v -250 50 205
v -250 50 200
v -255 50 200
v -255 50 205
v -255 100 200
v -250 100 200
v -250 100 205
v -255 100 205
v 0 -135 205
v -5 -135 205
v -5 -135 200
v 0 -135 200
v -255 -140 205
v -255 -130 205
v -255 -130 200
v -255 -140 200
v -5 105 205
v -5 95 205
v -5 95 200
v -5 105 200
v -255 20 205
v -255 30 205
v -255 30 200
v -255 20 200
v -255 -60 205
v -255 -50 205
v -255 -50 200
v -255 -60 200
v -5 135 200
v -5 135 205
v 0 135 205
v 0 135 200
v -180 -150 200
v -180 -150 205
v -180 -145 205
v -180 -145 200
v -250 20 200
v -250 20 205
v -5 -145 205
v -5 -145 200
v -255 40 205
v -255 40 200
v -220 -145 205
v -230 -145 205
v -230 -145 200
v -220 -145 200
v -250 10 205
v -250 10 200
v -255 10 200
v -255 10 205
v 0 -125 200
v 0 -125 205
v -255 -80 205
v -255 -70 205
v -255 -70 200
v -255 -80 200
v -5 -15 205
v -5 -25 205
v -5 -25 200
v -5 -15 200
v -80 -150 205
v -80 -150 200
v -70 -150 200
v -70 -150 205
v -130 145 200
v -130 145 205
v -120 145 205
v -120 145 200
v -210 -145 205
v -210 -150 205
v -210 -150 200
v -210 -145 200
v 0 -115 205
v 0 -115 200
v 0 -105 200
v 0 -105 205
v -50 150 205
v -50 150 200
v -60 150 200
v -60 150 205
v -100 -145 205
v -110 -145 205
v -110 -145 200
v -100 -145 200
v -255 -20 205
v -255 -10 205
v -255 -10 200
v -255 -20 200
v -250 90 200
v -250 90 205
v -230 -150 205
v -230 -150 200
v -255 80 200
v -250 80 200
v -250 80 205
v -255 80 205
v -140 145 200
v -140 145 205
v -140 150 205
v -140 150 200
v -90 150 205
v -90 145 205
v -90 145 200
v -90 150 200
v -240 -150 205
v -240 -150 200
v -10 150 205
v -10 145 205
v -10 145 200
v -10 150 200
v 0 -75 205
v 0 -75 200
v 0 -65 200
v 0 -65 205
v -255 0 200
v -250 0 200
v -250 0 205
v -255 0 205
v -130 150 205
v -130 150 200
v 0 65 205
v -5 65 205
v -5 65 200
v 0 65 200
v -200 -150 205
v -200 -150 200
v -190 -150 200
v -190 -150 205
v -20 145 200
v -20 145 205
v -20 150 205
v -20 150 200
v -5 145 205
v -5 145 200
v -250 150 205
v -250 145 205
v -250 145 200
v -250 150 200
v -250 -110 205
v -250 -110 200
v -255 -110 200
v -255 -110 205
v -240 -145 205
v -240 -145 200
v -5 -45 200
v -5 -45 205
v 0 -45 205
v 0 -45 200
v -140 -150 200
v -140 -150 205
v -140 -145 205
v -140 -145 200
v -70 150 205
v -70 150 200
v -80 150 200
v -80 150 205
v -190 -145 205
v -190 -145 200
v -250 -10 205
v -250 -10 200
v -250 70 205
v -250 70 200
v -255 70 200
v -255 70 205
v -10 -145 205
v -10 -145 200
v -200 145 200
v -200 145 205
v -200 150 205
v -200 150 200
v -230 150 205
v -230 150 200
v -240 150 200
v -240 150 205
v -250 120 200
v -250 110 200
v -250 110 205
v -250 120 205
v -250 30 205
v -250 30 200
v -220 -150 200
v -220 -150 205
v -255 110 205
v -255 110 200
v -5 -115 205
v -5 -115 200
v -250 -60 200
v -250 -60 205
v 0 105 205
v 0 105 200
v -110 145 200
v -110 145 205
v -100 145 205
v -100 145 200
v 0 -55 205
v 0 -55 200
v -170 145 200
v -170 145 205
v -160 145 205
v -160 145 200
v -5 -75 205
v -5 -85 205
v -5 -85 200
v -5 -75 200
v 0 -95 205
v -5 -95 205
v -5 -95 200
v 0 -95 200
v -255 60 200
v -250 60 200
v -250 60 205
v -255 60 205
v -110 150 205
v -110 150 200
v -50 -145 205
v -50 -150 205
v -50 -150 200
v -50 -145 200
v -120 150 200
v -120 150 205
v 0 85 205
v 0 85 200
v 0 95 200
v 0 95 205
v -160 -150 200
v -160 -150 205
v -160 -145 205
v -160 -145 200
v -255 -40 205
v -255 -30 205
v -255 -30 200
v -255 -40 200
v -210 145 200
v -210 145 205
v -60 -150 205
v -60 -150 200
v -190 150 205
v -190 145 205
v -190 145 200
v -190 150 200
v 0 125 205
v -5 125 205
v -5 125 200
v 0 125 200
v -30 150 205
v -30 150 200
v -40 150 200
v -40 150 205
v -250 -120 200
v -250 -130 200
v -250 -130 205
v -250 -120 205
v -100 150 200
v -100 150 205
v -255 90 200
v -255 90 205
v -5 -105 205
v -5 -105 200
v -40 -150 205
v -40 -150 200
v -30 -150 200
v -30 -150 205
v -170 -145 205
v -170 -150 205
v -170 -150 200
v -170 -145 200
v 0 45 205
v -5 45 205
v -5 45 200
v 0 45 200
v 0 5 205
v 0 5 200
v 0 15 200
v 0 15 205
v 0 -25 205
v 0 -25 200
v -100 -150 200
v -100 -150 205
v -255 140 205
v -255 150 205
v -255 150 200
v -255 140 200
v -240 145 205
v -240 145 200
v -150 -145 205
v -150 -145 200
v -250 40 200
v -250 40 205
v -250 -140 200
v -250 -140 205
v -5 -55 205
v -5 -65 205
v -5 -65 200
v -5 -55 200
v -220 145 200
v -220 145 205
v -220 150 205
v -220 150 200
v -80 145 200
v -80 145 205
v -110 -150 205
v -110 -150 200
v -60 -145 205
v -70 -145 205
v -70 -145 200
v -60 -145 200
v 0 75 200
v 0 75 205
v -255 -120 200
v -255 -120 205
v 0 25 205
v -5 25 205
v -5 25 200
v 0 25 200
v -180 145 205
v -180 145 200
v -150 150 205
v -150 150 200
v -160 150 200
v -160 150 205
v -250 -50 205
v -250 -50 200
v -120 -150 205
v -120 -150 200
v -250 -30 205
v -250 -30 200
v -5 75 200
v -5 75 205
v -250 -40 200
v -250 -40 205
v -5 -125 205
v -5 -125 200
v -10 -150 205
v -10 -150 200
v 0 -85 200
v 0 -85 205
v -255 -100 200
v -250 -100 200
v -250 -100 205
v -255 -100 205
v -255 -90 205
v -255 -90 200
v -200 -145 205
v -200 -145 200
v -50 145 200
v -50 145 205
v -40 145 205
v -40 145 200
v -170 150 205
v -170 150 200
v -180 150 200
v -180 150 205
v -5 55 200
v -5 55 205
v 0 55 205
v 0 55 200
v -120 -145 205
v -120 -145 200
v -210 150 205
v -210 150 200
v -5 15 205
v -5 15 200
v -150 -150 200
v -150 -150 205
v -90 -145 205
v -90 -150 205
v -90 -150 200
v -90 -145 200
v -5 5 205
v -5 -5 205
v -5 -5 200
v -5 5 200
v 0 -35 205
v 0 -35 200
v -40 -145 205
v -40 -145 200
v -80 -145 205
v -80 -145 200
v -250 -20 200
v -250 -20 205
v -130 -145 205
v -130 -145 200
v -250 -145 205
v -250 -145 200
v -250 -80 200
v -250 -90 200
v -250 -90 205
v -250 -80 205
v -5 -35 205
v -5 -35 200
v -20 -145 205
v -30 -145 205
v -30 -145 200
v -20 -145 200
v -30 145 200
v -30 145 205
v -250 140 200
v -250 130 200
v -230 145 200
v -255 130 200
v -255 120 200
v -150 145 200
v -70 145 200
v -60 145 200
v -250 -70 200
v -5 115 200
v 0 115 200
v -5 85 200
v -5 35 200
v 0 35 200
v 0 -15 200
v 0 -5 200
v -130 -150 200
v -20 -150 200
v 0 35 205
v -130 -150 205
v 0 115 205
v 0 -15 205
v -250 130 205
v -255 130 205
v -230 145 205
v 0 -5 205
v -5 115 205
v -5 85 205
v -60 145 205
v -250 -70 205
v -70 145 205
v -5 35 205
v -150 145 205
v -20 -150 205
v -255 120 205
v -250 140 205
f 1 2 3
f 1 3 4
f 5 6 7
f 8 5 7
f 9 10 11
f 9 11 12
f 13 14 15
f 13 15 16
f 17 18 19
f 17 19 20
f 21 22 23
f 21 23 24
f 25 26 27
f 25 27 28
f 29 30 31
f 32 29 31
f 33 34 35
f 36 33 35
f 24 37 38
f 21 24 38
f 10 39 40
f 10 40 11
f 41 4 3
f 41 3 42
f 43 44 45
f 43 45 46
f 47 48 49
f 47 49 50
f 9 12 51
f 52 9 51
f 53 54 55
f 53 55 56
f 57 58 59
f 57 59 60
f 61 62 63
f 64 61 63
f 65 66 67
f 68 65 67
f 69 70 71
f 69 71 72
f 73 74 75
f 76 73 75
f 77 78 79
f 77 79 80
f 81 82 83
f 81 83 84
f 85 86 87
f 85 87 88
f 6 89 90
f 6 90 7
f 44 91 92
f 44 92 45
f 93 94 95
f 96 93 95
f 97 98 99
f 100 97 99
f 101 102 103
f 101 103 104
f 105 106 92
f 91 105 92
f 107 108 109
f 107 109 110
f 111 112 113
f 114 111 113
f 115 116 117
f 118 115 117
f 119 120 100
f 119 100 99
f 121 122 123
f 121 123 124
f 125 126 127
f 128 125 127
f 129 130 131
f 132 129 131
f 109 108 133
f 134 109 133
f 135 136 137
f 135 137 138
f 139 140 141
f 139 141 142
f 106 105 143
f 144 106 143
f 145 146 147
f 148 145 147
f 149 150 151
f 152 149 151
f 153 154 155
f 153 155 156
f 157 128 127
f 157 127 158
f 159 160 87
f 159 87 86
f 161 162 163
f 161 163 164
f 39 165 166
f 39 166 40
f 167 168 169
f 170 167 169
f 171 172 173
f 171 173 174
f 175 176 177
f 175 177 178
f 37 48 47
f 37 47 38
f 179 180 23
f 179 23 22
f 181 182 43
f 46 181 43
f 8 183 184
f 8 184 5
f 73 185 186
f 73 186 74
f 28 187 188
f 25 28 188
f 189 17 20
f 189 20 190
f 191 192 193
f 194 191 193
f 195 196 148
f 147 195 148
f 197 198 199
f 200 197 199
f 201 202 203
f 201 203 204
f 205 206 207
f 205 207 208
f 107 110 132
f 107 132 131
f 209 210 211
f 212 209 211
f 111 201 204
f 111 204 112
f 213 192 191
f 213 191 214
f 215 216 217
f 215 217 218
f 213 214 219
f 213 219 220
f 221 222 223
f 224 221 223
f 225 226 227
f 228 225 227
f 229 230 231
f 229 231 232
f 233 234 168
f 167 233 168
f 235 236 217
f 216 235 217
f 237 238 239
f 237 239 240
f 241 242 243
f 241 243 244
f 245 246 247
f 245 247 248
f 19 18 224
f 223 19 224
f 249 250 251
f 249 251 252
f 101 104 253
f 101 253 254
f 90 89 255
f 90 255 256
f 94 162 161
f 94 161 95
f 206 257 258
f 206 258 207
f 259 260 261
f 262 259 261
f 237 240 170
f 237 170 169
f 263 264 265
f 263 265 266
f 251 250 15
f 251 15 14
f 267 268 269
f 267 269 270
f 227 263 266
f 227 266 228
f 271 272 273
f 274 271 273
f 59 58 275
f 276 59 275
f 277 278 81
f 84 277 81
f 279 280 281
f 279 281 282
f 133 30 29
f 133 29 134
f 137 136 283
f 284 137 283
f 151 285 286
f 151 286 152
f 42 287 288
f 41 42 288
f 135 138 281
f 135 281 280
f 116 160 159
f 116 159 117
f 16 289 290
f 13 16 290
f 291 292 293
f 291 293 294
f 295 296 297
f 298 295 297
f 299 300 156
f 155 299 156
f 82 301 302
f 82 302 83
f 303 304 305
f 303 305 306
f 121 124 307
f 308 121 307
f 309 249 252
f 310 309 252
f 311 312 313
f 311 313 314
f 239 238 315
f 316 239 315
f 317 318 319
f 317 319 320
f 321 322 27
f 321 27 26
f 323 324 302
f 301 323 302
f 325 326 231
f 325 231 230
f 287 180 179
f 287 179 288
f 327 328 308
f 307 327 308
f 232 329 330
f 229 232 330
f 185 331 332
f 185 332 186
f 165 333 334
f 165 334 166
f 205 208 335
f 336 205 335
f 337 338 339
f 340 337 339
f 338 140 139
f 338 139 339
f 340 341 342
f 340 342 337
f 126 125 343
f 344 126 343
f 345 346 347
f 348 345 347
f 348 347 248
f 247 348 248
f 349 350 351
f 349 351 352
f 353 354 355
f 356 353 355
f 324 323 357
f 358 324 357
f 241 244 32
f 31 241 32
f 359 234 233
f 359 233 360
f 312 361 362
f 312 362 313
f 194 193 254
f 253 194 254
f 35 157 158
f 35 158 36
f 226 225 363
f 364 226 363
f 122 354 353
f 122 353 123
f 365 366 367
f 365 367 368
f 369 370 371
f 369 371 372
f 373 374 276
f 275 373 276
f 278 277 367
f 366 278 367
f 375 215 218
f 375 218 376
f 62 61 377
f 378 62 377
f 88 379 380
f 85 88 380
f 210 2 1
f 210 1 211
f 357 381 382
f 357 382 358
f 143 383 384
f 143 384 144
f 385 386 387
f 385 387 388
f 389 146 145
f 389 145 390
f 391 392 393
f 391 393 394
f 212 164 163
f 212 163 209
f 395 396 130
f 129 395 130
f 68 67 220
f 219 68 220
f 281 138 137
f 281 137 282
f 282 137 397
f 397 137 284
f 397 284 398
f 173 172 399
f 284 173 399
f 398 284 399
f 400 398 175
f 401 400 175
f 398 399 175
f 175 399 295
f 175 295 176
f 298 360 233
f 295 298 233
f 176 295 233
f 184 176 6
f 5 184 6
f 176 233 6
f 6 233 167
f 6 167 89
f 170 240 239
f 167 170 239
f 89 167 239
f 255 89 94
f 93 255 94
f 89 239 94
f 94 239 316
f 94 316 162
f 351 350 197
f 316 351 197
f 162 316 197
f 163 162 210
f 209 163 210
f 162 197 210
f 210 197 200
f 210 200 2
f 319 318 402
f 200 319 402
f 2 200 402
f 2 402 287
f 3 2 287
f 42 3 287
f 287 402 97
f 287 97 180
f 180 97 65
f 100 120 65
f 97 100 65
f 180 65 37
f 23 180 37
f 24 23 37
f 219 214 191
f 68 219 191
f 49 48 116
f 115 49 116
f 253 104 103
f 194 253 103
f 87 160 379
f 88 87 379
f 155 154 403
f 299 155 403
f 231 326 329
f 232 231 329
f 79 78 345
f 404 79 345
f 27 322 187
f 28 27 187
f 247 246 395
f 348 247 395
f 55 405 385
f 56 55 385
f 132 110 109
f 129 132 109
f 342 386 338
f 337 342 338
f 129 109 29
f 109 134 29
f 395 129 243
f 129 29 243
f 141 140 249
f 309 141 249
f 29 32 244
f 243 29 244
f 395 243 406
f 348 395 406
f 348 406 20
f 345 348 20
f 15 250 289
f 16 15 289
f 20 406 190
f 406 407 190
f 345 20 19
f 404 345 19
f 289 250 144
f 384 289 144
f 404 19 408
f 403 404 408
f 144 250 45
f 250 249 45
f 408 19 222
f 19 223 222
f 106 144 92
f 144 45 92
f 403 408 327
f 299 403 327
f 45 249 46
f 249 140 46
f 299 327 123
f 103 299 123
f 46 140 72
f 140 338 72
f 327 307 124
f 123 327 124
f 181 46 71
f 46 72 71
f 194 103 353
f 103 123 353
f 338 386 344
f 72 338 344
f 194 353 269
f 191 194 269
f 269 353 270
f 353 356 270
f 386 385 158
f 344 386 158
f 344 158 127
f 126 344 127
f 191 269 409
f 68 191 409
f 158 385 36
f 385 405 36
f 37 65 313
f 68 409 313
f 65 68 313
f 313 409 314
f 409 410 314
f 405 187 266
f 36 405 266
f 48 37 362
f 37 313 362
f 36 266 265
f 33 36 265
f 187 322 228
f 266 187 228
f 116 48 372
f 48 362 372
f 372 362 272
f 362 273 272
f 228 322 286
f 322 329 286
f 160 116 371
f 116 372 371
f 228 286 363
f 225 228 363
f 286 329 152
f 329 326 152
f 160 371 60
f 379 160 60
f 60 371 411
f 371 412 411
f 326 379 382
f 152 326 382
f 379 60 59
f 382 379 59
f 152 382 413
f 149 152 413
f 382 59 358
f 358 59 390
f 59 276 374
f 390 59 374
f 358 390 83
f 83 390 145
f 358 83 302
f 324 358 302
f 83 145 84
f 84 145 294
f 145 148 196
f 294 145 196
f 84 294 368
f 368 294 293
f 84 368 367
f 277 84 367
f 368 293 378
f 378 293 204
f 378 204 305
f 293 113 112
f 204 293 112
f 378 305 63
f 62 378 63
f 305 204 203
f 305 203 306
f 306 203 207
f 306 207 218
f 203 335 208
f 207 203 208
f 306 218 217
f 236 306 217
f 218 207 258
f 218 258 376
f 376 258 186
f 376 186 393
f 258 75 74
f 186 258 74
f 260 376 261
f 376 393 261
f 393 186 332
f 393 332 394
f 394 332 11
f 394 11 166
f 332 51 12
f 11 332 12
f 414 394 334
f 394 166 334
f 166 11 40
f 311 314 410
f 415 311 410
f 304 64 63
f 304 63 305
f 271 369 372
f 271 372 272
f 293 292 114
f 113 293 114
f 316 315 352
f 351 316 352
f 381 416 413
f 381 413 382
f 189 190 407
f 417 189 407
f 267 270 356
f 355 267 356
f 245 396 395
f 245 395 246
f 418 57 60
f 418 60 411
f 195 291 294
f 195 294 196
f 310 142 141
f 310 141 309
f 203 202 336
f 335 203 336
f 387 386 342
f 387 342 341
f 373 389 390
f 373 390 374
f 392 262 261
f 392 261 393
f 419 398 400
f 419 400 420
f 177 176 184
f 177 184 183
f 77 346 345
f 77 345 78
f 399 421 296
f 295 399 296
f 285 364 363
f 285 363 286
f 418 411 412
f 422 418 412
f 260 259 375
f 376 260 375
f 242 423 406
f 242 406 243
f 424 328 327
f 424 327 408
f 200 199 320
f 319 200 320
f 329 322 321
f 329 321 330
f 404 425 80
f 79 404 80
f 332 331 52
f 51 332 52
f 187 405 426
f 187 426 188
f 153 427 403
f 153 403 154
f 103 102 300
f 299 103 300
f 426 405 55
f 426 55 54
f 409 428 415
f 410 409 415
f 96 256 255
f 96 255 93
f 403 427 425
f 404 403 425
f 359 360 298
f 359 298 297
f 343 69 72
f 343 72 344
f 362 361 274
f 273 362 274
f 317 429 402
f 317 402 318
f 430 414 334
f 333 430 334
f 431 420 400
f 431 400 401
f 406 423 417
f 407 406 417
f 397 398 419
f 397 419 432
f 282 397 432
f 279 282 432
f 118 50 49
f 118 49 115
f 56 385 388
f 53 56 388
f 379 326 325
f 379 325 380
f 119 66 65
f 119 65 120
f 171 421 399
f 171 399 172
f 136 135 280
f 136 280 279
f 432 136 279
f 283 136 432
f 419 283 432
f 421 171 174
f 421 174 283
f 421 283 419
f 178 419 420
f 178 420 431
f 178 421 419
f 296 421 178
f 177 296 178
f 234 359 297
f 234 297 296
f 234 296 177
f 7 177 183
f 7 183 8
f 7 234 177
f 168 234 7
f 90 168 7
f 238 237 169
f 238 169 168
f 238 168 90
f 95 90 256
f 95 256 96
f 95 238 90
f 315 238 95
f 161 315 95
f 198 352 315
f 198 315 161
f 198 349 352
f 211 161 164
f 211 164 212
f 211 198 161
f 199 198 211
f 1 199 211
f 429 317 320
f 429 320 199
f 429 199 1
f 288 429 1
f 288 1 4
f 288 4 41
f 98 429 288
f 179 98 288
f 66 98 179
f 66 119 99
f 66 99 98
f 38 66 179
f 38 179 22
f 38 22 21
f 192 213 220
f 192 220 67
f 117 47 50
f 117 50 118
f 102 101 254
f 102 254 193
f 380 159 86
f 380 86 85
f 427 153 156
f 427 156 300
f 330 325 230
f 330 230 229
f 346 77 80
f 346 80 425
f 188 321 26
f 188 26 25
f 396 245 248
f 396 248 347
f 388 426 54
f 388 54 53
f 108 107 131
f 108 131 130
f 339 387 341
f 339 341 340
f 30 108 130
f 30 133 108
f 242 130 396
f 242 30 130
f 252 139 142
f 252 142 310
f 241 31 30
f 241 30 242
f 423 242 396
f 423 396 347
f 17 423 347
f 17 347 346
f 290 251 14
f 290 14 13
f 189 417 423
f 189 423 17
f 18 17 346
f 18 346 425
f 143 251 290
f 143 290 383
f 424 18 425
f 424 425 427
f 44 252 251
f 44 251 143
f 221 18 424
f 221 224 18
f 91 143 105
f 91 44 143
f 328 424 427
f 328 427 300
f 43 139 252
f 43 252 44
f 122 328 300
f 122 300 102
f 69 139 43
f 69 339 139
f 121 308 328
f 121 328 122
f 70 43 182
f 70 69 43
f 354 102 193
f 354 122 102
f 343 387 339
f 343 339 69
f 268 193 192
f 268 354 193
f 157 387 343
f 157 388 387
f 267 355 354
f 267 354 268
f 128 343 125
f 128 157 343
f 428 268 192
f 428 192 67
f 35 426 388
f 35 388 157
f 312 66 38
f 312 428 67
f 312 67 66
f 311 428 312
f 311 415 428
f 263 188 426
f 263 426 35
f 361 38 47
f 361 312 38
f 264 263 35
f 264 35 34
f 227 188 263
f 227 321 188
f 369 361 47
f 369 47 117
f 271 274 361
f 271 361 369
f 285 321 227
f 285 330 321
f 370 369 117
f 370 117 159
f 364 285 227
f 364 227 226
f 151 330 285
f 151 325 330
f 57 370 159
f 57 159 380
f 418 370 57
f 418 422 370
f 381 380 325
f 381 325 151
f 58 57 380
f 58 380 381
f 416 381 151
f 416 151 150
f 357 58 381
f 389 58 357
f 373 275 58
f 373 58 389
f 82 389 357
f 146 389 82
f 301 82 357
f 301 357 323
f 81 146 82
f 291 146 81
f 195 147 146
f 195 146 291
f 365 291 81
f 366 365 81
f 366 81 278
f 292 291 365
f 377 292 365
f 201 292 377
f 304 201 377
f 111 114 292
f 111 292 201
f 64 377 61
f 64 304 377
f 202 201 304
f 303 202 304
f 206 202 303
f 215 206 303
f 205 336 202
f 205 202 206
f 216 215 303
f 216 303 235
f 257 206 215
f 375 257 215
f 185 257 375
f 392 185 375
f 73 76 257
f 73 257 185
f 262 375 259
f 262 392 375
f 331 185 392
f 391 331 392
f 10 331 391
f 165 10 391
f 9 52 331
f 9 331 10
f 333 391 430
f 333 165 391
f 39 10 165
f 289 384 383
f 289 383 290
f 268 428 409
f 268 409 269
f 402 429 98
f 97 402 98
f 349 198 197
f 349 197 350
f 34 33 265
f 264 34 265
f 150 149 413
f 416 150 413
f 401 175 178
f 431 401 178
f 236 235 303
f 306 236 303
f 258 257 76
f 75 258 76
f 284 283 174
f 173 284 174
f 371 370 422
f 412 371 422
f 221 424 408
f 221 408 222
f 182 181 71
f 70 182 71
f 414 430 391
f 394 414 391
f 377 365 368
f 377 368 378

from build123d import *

# Parameters (mm, degrees)
SKETCH008_W            = 250
SKETCH008_H            = 300
PAD006_DEPTH           = 5
SKETCH034_W            = 10
SKETCH034_H            = 5
PAD026_DEPTH           = 5
LINEARPATTERN014_COUNT = 15
LINEARPATTERN014_PITCH = 20
SKETCH127_W            = 10
SKETCH127_H            = 5
POCKET037_DEPTH        = 5
LINEARPATTERN079_COUNT = 13
LINEARPATTERN079_PITCH = 20
SKETCH128_W            = 5
SKETCH128_H            = 10
POCKET038_DEPTH        = 5
LINEARPATTERN080_COUNT = 15
LINEARPATTERN080_PITCH = 20


with BuildPart() as part:
    # Sketch008 → Pad006 (new body)
    with BuildSketch(Plane.XY):
        Rectangle(SKETCH008_W, SKETCH008_H)
    extrude(amount=PAD006_DEPTH)

    # Sketch034 (on DatumPlane) → Pad026 (join)
    with BuildSketch(Plane(origin=(-125, 0, 0), x_dir=(0, -1, 0), z_dir=(-1, 0, 0))):
        with Locations((-145, 2.5)):
            Rectangle(SKETCH034_W, SKETCH034_H)
    pad026 = extrude(amount=PAD026_DEPTH)

    # LinearPattern014: Pad026 ×15
    with Locations(*[(0, -i * LINEARPATTERN014_PITCH, 0) for i in range(1, LINEARPATTERN014_COUNT)]):
        add(pad026)

    # Sketch127 (on DatumPlane) → Pocket037 (cut)
    with BuildSketch(Plane.XY.offset(5)):
        with Locations((-120, 147.5)):
            Rectangle(SKETCH127_W, SKETCH127_H)
        with Locations((-120, -147.5)):
            Rectangle(SKETCH127_W, SKETCH127_H)
    pocket037 = extrude(amount=-POCKET037_DEPTH, mode=Mode.SUBTRACT)

    # LinearPattern079: Pocket037 ×13
    with Locations(*[(i * LINEARPATTERN079_PITCH, 0, 0) for i in range(1, LINEARPATTERN079_COUNT)]):
        add(pocket037, mode=Mode.SUBTRACT)

    # Sketch128 (on DatumPlane) → Pocket038 (cut)
    with BuildSketch(Plane.XY.offset(5)):
        with Locations((122.5, 140)):
            Rectangle(SKETCH128_W, SKETCH128_H)
    pocket038 = extrude(amount=-POCKET038_DEPTH, mode=Mode.SUBTRACT)

    # LinearPattern080: Pocket038 ×15
    with Locations(*[(0, -i * LINEARPATTERN080_PITCH, 0) for i in range(1, LINEARPATTERN080_COUNT)]):
        add(pocket038, mode=Mode.SUBTRACT)


with BuildPart() as part_1:
    # Body006 placement: moved
    add(part.part.moved(Location((-125, 0, 200))))


solid = part_1.part
